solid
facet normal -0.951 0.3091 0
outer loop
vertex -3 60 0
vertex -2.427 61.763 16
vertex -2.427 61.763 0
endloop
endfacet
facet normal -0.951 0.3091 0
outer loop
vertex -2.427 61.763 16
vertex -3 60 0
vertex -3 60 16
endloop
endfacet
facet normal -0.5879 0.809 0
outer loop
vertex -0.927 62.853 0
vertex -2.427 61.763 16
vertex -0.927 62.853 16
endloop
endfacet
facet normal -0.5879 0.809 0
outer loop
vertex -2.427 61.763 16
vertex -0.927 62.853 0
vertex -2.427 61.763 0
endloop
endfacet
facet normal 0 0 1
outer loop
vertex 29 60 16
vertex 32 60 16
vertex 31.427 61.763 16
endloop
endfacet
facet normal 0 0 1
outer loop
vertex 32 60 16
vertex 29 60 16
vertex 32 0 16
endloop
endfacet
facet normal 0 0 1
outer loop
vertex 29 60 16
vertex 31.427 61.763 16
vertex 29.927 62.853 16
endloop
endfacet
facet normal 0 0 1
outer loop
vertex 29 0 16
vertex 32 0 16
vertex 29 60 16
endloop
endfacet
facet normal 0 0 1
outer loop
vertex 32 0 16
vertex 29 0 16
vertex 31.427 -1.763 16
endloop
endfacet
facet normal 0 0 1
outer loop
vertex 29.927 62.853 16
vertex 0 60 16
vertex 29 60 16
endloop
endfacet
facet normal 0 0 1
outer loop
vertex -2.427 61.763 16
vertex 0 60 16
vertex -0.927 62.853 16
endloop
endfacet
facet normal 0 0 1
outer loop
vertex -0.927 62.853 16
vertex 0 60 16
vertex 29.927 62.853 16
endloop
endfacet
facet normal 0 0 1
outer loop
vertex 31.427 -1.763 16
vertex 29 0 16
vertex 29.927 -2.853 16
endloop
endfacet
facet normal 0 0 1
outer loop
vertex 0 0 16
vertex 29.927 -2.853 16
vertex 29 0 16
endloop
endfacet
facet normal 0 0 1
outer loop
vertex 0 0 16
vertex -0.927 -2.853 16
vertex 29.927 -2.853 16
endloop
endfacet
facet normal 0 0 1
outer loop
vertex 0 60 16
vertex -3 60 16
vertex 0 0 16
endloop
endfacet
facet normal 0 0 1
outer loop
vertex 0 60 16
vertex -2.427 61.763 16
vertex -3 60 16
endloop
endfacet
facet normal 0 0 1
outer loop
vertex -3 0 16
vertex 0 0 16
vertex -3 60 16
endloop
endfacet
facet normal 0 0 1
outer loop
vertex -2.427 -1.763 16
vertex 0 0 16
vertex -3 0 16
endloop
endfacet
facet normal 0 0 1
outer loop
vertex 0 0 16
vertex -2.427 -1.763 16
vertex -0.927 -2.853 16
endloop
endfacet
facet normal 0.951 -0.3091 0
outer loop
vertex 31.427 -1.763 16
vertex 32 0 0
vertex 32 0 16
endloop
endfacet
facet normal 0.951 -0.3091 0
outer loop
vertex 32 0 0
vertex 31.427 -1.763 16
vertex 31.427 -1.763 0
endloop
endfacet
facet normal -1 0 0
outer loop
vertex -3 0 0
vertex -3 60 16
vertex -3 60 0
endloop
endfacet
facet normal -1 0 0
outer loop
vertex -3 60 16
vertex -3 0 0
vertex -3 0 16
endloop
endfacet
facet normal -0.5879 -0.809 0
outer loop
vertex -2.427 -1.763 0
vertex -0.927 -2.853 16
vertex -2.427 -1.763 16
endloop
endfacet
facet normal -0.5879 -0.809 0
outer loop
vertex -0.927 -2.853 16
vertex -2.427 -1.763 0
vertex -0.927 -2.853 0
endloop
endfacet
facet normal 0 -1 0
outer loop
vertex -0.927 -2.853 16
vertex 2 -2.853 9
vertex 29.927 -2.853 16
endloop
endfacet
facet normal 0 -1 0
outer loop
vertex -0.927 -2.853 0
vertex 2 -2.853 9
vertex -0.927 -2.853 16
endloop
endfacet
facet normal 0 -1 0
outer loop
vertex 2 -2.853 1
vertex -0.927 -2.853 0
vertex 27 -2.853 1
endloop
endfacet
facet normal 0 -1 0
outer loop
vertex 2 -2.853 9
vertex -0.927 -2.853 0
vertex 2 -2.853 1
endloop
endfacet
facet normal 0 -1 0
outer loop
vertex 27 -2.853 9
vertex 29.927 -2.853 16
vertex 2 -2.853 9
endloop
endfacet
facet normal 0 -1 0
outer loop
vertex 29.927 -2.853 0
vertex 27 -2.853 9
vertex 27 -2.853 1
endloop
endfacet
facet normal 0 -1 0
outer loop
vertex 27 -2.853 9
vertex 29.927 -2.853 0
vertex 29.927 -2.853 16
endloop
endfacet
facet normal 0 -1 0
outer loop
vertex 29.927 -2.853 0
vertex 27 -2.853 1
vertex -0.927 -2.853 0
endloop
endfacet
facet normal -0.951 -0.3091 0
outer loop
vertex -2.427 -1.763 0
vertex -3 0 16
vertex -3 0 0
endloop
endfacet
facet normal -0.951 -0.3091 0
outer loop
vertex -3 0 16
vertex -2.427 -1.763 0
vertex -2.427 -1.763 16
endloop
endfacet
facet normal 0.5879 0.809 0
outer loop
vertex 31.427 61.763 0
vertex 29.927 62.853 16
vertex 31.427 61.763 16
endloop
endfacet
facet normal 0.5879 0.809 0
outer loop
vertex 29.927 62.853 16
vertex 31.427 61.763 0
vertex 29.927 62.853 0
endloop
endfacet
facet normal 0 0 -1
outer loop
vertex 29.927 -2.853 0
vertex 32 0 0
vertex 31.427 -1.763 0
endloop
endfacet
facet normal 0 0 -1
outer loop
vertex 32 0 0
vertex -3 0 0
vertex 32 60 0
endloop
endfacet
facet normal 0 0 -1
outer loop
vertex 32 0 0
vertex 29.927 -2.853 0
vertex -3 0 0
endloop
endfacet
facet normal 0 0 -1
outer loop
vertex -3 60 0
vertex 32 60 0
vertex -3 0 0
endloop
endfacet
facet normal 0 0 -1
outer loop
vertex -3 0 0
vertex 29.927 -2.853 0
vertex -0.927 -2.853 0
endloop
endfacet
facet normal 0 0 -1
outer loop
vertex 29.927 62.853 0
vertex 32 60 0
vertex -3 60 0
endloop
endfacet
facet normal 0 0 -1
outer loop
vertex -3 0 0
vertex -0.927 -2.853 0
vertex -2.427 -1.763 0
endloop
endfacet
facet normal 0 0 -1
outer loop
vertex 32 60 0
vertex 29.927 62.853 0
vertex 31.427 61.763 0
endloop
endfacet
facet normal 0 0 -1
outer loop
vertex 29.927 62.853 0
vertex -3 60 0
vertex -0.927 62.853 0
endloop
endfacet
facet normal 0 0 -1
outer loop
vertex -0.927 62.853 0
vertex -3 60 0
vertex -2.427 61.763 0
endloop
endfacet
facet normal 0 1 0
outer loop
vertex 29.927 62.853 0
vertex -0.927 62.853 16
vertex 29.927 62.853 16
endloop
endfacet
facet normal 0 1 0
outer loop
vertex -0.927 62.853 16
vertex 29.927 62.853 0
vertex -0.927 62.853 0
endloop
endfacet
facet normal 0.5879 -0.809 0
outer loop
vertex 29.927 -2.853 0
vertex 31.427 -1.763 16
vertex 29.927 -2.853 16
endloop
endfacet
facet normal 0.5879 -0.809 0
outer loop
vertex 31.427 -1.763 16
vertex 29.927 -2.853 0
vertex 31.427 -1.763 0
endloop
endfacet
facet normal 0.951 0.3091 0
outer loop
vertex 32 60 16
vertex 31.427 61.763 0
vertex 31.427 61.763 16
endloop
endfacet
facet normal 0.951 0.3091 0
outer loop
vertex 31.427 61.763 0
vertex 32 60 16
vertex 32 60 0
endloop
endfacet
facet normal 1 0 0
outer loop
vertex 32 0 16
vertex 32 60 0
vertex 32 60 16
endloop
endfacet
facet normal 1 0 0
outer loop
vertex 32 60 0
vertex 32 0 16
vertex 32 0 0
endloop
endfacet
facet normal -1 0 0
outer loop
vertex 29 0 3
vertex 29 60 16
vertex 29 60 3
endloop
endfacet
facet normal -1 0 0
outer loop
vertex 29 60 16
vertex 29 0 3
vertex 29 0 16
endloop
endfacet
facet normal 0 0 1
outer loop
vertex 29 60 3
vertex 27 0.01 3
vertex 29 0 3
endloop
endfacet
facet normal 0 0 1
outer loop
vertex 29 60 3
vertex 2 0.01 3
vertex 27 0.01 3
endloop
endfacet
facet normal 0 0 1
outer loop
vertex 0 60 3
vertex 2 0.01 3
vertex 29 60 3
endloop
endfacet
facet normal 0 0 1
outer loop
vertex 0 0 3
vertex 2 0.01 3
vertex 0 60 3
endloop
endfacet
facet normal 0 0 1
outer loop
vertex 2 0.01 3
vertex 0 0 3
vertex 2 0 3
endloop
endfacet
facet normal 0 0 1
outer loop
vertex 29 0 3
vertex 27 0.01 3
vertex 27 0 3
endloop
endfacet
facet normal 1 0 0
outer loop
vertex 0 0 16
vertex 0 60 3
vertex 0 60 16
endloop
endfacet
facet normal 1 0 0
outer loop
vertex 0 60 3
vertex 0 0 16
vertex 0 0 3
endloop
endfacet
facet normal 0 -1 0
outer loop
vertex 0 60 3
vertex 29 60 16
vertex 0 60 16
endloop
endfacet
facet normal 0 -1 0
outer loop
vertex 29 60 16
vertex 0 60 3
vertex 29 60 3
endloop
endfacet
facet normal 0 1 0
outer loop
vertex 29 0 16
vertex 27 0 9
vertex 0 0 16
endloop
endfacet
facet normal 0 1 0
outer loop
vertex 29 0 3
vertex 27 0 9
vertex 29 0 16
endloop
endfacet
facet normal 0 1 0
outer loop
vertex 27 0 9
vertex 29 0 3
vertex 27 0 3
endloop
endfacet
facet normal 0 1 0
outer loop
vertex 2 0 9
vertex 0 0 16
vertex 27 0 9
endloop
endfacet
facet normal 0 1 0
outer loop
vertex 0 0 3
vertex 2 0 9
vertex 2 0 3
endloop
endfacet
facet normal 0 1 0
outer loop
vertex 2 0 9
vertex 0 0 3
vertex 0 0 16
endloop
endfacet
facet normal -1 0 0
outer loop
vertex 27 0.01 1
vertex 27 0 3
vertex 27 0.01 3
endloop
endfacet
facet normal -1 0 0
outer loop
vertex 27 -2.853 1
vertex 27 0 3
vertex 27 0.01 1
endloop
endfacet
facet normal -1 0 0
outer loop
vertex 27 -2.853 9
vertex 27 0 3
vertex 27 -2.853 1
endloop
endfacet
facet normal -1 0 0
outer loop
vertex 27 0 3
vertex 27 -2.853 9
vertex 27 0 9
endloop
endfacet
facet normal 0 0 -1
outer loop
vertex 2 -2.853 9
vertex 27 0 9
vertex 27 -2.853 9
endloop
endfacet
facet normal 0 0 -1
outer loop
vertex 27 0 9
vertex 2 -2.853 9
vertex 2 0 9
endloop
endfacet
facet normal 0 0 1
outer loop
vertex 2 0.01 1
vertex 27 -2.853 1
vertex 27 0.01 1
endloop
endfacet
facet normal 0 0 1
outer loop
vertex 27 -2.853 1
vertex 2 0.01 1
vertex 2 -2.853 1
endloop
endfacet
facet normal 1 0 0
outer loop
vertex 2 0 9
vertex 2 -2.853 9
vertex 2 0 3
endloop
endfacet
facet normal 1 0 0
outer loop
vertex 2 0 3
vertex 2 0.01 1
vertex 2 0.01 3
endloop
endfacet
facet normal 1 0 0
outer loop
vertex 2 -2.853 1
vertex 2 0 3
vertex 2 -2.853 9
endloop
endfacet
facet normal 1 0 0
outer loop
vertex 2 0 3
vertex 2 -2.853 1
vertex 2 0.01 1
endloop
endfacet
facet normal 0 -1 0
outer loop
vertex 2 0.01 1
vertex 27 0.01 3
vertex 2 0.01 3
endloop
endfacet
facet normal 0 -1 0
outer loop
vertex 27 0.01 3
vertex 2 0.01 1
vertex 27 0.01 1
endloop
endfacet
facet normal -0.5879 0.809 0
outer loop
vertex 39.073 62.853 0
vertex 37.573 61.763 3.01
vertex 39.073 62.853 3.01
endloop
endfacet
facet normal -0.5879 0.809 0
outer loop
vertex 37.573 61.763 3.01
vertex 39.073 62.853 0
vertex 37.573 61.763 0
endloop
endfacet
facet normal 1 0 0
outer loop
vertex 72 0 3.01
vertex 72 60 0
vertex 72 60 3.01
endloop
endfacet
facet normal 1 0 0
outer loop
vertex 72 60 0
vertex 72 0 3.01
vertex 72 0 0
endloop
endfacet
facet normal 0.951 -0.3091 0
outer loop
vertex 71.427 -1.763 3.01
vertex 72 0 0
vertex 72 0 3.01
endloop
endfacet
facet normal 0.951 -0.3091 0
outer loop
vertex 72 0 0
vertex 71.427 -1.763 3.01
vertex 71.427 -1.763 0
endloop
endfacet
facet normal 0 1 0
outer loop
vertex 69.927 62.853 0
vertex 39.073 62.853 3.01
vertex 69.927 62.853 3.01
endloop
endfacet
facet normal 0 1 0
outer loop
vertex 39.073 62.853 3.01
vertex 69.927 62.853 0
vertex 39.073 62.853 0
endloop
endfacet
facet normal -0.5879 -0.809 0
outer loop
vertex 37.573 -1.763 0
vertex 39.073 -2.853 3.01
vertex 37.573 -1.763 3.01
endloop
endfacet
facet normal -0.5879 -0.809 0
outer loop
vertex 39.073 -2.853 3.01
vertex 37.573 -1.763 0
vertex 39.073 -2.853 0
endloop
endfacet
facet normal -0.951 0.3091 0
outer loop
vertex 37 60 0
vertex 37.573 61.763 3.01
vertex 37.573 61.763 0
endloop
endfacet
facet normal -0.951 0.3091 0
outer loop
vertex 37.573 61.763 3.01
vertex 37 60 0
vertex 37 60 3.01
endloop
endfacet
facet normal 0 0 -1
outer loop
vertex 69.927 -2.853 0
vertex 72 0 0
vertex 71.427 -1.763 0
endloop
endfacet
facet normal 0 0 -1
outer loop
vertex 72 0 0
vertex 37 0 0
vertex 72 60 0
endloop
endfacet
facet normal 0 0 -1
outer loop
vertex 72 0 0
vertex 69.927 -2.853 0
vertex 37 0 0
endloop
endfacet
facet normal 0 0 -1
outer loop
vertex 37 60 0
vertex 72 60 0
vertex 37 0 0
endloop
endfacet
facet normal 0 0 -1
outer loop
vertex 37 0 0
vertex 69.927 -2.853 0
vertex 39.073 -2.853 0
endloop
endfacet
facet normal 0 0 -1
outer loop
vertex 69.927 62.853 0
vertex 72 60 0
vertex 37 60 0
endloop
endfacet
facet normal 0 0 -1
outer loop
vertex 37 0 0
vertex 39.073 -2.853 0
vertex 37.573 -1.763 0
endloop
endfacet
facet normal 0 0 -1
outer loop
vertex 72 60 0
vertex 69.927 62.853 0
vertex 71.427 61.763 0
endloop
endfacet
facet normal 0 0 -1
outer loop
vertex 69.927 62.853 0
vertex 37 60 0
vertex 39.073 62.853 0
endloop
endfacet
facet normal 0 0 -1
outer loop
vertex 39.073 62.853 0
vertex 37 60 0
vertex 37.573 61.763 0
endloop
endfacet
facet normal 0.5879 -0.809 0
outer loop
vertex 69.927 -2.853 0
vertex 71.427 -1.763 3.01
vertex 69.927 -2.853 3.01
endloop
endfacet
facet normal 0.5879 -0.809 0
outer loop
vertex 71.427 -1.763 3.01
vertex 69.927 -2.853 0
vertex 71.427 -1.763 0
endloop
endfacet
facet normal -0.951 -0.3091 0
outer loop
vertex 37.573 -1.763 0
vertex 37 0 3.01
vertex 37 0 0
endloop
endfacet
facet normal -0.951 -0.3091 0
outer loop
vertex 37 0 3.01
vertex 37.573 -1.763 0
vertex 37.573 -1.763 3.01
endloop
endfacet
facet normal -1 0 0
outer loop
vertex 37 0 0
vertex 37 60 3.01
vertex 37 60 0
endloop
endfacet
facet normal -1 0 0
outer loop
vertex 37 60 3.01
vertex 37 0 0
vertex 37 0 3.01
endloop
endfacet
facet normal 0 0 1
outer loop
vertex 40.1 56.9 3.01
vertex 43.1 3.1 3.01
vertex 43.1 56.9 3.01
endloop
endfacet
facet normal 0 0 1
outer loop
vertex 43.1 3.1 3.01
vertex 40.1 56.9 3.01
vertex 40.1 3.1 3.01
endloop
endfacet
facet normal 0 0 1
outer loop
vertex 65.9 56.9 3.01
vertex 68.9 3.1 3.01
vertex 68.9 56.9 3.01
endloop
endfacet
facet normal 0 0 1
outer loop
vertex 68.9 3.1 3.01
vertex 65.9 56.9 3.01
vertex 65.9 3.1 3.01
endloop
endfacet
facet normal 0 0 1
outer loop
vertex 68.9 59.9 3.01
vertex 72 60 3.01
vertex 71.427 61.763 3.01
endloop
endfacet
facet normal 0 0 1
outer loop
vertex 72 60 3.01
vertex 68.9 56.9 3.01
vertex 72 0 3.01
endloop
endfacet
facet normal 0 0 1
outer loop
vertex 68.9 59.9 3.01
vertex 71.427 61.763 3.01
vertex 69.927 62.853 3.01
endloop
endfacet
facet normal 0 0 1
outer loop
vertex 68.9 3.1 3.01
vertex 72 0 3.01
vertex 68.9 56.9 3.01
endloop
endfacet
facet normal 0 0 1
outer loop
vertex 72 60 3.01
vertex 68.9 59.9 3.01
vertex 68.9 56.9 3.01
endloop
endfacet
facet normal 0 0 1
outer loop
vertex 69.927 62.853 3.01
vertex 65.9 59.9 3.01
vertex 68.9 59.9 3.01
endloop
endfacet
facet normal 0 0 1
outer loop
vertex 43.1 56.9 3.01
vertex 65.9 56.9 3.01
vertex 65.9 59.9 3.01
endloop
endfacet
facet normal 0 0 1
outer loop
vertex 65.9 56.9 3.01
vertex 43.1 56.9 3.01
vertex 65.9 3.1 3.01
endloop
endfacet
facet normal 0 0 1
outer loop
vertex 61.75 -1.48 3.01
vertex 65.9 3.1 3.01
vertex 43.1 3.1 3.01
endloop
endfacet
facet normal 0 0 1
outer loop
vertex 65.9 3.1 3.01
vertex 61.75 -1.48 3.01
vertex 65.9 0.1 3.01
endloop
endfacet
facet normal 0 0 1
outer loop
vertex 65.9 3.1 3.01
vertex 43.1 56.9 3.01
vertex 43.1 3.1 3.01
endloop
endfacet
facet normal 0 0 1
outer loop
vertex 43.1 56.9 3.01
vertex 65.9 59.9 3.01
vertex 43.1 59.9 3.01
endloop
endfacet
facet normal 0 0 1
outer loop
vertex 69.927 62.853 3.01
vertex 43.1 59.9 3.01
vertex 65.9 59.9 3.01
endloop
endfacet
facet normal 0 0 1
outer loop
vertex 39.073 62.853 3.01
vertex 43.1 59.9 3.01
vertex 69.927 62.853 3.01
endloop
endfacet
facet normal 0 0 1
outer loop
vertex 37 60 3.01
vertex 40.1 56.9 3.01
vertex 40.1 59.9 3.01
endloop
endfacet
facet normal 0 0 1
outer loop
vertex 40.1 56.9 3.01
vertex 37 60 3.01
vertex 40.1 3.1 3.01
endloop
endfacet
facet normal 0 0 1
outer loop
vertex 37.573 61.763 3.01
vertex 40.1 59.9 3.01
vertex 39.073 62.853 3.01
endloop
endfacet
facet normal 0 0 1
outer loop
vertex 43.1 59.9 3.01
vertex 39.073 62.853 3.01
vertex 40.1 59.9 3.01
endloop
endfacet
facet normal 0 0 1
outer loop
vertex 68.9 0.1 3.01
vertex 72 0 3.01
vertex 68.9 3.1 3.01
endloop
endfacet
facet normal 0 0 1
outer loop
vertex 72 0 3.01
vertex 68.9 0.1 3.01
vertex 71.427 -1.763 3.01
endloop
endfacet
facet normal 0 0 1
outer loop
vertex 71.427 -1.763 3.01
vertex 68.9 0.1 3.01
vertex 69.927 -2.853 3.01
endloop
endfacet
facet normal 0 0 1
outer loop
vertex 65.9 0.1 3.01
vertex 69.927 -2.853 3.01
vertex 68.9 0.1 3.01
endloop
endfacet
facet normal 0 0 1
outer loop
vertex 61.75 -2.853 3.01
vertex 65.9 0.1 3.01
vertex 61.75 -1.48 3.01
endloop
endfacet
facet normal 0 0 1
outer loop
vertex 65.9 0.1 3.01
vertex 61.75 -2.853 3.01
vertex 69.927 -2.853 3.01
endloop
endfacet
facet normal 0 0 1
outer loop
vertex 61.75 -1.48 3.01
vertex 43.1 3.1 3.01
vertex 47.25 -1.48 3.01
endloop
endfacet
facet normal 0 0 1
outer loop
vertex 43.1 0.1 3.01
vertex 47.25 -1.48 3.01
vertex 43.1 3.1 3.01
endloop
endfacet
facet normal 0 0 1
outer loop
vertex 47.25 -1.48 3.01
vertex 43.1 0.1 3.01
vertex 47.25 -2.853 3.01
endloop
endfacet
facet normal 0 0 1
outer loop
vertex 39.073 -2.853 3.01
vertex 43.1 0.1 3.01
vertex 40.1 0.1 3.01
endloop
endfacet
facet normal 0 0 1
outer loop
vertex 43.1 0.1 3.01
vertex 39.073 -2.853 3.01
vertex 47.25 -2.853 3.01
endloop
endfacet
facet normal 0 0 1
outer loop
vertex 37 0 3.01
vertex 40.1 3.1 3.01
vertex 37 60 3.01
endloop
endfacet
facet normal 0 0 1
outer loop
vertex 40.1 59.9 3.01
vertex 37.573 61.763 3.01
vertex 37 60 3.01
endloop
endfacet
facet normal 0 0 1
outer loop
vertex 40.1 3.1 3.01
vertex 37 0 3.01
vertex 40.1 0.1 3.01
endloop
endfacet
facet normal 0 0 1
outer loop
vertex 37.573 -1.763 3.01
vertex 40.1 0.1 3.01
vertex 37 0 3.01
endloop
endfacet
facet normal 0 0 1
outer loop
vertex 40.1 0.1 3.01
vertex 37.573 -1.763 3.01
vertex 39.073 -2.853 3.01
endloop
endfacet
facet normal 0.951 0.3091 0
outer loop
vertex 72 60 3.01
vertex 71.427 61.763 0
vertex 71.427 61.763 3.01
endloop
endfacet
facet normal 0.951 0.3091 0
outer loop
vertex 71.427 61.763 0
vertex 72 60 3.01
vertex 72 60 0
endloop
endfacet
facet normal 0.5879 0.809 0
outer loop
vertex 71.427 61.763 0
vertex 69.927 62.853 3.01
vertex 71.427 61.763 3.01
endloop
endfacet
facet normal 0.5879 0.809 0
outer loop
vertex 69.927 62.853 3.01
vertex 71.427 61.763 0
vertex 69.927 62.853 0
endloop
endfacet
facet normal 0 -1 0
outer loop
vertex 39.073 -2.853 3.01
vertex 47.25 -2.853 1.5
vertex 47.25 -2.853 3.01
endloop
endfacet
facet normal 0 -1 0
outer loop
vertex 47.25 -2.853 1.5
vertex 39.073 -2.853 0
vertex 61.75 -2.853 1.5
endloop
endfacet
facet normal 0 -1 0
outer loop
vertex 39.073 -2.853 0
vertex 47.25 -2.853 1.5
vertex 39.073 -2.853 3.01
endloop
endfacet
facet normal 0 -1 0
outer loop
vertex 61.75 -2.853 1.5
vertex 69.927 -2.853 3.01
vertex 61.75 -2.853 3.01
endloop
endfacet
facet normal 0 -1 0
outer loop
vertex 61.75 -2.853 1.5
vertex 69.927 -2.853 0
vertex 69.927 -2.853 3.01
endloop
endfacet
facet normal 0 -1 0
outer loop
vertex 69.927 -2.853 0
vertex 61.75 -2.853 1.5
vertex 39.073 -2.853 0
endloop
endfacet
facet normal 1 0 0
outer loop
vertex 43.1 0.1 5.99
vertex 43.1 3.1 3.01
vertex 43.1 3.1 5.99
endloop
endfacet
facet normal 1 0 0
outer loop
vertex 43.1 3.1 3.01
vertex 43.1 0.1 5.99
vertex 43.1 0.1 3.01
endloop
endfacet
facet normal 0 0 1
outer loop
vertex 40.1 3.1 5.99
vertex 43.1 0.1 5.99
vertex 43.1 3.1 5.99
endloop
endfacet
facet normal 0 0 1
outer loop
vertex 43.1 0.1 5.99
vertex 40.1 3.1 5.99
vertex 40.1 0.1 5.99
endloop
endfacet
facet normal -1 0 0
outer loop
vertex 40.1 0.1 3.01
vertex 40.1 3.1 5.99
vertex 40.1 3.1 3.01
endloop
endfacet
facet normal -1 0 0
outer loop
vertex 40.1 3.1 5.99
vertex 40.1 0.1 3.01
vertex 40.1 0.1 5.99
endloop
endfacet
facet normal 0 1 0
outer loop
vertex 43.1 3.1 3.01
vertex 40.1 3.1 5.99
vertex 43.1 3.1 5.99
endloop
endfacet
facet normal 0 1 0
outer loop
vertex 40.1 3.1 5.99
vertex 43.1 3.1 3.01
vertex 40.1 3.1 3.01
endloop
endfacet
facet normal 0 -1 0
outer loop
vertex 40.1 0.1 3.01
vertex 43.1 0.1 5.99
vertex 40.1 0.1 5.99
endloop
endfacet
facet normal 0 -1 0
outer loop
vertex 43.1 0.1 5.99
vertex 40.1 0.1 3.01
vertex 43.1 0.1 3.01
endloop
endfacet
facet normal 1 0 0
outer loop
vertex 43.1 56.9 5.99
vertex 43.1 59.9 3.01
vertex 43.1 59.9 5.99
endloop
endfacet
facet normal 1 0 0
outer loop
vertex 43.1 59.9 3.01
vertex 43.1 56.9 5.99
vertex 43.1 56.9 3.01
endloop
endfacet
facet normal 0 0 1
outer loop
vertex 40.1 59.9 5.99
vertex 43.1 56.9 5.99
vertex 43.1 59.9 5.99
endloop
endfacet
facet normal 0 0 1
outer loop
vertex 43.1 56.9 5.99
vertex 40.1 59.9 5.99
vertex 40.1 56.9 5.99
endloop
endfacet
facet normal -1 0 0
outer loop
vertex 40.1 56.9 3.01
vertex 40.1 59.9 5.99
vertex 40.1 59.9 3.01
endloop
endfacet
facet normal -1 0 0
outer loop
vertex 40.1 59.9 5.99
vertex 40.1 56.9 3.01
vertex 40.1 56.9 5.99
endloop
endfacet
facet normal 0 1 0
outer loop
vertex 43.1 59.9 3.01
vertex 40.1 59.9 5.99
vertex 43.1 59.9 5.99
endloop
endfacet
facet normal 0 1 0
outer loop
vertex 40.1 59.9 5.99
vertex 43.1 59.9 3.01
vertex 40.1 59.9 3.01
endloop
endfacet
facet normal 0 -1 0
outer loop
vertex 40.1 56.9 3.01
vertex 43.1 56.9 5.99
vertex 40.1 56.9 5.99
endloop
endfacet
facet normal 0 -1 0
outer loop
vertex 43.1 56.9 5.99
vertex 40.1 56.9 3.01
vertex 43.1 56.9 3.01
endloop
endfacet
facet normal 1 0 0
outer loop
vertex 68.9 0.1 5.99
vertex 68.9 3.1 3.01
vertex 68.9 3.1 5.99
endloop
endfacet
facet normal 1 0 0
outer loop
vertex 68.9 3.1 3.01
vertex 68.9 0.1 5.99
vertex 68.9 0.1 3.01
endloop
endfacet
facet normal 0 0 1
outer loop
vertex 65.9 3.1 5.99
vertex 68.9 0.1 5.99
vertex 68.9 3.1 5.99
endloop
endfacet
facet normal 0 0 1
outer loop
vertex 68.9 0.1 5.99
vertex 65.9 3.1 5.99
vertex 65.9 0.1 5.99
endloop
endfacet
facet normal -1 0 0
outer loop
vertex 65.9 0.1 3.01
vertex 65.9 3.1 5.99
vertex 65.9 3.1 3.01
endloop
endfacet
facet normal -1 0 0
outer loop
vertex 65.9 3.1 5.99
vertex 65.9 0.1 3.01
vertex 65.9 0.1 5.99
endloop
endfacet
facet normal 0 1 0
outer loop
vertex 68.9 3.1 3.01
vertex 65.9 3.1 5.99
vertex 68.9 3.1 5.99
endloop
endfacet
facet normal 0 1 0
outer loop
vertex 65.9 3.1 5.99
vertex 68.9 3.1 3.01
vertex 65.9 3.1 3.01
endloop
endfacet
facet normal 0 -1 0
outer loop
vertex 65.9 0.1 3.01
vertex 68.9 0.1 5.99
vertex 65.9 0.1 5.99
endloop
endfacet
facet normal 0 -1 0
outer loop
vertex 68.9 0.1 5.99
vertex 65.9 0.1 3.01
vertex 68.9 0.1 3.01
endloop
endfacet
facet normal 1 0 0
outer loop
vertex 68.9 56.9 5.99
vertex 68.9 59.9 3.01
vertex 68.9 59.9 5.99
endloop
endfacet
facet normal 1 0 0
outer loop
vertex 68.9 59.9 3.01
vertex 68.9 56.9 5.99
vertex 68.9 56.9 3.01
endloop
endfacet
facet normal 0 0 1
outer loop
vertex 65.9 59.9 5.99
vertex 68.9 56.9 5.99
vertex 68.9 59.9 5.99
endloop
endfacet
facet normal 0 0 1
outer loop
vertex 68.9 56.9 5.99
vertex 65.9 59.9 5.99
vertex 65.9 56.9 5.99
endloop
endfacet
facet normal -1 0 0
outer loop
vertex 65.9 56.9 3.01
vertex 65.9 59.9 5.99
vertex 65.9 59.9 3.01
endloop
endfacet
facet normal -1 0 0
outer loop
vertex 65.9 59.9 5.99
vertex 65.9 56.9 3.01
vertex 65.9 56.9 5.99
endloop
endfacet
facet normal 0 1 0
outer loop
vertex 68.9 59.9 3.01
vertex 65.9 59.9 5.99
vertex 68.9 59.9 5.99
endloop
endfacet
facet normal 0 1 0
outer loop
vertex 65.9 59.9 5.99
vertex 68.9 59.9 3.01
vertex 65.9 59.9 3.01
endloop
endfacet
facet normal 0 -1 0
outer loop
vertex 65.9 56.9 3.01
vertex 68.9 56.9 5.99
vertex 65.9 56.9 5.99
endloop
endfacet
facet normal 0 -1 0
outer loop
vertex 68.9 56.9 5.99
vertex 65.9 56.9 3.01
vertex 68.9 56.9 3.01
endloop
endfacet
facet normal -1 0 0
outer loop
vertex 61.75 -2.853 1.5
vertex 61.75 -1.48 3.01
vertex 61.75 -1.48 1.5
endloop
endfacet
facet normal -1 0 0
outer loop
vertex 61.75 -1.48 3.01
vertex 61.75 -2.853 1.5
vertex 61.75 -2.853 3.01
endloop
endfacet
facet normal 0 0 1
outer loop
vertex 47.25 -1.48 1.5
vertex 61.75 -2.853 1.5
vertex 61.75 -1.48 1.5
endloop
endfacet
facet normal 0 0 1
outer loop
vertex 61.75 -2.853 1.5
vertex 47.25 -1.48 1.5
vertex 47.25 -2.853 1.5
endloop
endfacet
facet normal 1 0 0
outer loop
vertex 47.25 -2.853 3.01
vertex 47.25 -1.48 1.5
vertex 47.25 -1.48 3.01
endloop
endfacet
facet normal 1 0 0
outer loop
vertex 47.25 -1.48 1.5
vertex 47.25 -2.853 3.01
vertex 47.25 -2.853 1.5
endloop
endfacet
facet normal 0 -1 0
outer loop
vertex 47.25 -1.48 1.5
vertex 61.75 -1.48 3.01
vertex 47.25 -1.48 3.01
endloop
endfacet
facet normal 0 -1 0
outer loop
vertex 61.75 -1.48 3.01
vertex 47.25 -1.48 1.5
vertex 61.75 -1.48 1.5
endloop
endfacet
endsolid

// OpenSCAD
wall = 3;
inner_x = 29;
inner_y = 60;
inner_z = 10 + wall;
connector_z = 8;
connector_x = inner_x - 4;
connector_offset = -2;
eps = 0.01;
stub_offset = 0.1;

// Bottom portion of the case
difference(){
  minkowski(){
    cube([inner_x, inner_y, wall]);
    cylinder(r=wall, h=inner_z);
  }
  translate([0, 0, wall]) cube([inner_x, inner_y, inner_z + eps]);
  translate([(inner_x - connector_x) / 2, -wall, wall + connector_offset]) cube([connector_x, wall + eps, connector_z]);
}

// Lid
difference(){
  union() {
    translate([40, 0, 0]){
      minkowski(){
        cube([inner_x, inner_y, wall]);
        cylinder(r=wall, h=eps);
      }
    }
    translate([40 + stub_offset, stub_offset, wall - eps]) cube([wall, wall, wall]);
    translate([40 + stub_offset, inner_y - wall - stub_offset, wall - eps]) cube([wall, wall, wall]);
    translate([40 + inner_x - wall - stub_offset, stub_offset, wall - eps]) cube([wall, wall, wall]);
    translate([40 + inner_x - wall - stub_offset, inner_y - wall - stub_offset, wall - eps]) cube([wall, wall, wall]);
  }
  translate([40 + inner_x / 4, -wall + eps, wall / 2]) cube([inner_x / 2, wall / 2 + eps, wall / 2 + 2 * eps]);
}
